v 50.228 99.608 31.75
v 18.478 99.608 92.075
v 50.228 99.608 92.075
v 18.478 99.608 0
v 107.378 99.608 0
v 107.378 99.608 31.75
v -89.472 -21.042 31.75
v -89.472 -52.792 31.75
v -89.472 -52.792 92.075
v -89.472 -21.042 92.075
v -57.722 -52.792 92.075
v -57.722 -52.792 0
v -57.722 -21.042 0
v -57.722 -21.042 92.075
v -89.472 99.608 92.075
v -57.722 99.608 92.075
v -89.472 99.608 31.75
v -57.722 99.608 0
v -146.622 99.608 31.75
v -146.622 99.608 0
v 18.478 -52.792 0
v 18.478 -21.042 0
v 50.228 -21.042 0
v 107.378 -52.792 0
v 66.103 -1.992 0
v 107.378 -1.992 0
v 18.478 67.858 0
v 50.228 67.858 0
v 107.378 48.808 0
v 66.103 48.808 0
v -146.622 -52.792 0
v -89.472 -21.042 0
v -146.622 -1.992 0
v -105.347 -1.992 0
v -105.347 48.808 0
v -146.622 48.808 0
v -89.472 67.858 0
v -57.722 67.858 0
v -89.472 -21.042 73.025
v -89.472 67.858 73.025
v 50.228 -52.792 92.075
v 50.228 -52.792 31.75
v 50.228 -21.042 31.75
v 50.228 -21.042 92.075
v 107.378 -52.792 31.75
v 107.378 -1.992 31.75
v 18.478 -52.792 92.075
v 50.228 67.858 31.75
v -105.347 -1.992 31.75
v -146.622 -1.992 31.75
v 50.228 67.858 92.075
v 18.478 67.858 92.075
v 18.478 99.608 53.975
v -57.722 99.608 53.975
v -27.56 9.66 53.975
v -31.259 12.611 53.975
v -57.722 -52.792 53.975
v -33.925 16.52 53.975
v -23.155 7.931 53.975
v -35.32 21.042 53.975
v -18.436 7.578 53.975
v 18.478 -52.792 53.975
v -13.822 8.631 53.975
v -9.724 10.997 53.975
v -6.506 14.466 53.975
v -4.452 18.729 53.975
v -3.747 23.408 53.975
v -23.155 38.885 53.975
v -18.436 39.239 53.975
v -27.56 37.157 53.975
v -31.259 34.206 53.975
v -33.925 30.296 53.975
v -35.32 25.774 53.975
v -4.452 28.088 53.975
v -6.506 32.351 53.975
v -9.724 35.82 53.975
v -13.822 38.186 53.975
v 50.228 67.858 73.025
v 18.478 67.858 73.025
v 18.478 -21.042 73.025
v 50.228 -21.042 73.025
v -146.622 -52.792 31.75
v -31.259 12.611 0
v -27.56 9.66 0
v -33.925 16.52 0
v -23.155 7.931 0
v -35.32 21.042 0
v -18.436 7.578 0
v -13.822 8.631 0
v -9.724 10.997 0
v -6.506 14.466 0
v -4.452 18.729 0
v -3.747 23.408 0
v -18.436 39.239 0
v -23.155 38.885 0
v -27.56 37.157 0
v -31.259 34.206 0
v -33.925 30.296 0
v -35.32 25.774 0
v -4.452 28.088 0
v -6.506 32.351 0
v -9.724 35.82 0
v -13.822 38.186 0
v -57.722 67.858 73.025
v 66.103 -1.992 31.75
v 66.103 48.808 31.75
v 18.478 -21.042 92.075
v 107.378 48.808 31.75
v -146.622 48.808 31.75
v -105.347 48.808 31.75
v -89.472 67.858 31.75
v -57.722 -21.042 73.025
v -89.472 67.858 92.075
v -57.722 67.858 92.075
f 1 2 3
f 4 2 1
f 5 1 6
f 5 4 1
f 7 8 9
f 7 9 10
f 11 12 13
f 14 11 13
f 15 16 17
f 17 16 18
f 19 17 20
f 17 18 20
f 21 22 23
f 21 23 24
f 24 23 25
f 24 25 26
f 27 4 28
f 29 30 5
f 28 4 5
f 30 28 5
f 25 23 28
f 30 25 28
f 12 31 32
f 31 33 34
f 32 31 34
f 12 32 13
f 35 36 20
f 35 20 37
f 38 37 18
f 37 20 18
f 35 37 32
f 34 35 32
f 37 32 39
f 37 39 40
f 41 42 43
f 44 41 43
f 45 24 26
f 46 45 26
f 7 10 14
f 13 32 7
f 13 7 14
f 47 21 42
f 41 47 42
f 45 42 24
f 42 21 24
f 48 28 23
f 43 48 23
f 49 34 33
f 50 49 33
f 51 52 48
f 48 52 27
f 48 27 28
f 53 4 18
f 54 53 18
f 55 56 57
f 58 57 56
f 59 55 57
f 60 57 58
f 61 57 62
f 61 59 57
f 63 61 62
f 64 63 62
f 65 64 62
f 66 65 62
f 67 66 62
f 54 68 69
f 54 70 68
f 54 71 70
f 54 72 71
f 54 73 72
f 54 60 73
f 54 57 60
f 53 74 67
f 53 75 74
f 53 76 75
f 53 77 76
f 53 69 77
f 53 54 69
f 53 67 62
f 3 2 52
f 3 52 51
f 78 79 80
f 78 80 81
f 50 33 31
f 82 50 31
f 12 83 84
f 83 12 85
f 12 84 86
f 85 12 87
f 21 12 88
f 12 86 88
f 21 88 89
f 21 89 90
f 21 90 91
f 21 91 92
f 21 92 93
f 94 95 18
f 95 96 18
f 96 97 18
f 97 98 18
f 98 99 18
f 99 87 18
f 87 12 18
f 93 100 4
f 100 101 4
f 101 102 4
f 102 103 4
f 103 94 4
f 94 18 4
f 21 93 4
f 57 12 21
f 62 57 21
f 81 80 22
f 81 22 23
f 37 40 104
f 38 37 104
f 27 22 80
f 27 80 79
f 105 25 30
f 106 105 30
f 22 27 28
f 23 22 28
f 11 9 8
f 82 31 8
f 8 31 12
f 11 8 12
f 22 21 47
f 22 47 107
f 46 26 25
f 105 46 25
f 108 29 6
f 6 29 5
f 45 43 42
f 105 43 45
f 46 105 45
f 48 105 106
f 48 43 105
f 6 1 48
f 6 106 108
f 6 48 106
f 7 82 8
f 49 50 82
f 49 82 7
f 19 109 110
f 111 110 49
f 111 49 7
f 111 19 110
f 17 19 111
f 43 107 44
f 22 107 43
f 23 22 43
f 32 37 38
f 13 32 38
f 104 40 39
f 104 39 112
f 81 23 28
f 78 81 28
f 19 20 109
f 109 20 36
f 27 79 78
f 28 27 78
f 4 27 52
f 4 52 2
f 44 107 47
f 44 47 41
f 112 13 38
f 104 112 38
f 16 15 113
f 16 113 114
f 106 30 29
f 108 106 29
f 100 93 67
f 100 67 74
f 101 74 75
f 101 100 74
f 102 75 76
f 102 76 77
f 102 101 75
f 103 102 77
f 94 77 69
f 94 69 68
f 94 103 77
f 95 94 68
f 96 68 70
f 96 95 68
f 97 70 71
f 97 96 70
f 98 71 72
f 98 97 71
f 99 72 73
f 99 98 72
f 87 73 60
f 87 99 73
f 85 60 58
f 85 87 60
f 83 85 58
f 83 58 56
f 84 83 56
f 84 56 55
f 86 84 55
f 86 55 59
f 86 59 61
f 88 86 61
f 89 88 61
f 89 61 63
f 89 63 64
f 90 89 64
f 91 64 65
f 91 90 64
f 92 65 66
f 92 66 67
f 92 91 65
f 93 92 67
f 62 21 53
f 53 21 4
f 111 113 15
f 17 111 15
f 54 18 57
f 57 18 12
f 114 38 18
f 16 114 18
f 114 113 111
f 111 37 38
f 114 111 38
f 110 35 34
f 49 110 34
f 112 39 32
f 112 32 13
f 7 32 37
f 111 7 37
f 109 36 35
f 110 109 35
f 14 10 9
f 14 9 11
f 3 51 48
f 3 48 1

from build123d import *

# Parameters (mm, degrees)
F1_DEPTH = 31.75
F0_W     = 31.75
F0_H     = 31.75
F2_DEPTH = 92.075
F0_H_2   = 88.9
F3_DEPTH = 73.025
F0_R     = 15.875
F4_DEPTH = 53.975


with BuildPart() as f1:
    # F0 (on Top) → F1 (new body)
    with BuildSketch(Plane.XY):
        Polygon((107.377909, 99.608352), (50.227909, 99.608352), (50.227909, 67.858352), (50.227909, -21.041648), (50.227909, -52.791648), (107.377909, -52.791648), (107.377909, -1.991648), (66.102909, -1.991648), (66.102909, 48.808352), (107.377909, 48.808352), align=None)
        Polygon((-89.472091, 99.608352), (-146.622091, 99.608352), (-146.622091, 48.808352), (-105.347091, 48.808352), (-105.347091, -1.991648), (-146.622091, -1.991648), (-146.622091, -52.791648), (-89.472091, -52.791648), (-89.472091, -21.041648), (-89.472091, 67.858352), align=None)
    extrude(amount=F1_DEPTH)

    # F0 (on Top) → F2 (join)
    with BuildSketch(Plane.XY):
        with Locations((-73.597091, -36.916648)):
            Rectangle(F0_W, F0_H)
        with Locations((-73.597091, 83.733352)):
            Rectangle(F0_W, F0_H)
        with Locations((34.352909, 83.733352)):
            Rectangle(F0_W, F0_H)
        with Locations((34.352909, -36.916648)):
            Rectangle(F0_W, F0_H)
    extrude(amount=F2_DEPTH)


with BuildPart() as f3:
    # F0 (on Top) → F3 (new body)
    with BuildSketch(Plane.XY):
        with Locations((-73.597091, 23.408352)):
            Rectangle(F0_W, F0_H_2)
        with Locations((34.352909, 23.408352)):
            Rectangle(F0_W, F0_H_2)
    extrude(amount=F3_DEPTH)


with BuildPart() as f4:
    # F0 (on Top) → F4 (new body)
    with BuildSketch(Plane.XY):
        Polygon((18.477909, 99.608352), (-57.722091, 99.608352), (-57.722091, 67.858352), (-57.722091, -21.041648), (-57.722091, -52.791648), (18.477909, -52.791648), (18.477909, -21.041648), (18.477909, 67.858352), align=None)
        with Locations((-19.622091, 23.408352)):
            Circle(F0_R, mode=Mode.SUBTRACT)
    extrude(amount=F4_DEPTH)


solid = Compound([f1.part, f3.part, f4.part])
